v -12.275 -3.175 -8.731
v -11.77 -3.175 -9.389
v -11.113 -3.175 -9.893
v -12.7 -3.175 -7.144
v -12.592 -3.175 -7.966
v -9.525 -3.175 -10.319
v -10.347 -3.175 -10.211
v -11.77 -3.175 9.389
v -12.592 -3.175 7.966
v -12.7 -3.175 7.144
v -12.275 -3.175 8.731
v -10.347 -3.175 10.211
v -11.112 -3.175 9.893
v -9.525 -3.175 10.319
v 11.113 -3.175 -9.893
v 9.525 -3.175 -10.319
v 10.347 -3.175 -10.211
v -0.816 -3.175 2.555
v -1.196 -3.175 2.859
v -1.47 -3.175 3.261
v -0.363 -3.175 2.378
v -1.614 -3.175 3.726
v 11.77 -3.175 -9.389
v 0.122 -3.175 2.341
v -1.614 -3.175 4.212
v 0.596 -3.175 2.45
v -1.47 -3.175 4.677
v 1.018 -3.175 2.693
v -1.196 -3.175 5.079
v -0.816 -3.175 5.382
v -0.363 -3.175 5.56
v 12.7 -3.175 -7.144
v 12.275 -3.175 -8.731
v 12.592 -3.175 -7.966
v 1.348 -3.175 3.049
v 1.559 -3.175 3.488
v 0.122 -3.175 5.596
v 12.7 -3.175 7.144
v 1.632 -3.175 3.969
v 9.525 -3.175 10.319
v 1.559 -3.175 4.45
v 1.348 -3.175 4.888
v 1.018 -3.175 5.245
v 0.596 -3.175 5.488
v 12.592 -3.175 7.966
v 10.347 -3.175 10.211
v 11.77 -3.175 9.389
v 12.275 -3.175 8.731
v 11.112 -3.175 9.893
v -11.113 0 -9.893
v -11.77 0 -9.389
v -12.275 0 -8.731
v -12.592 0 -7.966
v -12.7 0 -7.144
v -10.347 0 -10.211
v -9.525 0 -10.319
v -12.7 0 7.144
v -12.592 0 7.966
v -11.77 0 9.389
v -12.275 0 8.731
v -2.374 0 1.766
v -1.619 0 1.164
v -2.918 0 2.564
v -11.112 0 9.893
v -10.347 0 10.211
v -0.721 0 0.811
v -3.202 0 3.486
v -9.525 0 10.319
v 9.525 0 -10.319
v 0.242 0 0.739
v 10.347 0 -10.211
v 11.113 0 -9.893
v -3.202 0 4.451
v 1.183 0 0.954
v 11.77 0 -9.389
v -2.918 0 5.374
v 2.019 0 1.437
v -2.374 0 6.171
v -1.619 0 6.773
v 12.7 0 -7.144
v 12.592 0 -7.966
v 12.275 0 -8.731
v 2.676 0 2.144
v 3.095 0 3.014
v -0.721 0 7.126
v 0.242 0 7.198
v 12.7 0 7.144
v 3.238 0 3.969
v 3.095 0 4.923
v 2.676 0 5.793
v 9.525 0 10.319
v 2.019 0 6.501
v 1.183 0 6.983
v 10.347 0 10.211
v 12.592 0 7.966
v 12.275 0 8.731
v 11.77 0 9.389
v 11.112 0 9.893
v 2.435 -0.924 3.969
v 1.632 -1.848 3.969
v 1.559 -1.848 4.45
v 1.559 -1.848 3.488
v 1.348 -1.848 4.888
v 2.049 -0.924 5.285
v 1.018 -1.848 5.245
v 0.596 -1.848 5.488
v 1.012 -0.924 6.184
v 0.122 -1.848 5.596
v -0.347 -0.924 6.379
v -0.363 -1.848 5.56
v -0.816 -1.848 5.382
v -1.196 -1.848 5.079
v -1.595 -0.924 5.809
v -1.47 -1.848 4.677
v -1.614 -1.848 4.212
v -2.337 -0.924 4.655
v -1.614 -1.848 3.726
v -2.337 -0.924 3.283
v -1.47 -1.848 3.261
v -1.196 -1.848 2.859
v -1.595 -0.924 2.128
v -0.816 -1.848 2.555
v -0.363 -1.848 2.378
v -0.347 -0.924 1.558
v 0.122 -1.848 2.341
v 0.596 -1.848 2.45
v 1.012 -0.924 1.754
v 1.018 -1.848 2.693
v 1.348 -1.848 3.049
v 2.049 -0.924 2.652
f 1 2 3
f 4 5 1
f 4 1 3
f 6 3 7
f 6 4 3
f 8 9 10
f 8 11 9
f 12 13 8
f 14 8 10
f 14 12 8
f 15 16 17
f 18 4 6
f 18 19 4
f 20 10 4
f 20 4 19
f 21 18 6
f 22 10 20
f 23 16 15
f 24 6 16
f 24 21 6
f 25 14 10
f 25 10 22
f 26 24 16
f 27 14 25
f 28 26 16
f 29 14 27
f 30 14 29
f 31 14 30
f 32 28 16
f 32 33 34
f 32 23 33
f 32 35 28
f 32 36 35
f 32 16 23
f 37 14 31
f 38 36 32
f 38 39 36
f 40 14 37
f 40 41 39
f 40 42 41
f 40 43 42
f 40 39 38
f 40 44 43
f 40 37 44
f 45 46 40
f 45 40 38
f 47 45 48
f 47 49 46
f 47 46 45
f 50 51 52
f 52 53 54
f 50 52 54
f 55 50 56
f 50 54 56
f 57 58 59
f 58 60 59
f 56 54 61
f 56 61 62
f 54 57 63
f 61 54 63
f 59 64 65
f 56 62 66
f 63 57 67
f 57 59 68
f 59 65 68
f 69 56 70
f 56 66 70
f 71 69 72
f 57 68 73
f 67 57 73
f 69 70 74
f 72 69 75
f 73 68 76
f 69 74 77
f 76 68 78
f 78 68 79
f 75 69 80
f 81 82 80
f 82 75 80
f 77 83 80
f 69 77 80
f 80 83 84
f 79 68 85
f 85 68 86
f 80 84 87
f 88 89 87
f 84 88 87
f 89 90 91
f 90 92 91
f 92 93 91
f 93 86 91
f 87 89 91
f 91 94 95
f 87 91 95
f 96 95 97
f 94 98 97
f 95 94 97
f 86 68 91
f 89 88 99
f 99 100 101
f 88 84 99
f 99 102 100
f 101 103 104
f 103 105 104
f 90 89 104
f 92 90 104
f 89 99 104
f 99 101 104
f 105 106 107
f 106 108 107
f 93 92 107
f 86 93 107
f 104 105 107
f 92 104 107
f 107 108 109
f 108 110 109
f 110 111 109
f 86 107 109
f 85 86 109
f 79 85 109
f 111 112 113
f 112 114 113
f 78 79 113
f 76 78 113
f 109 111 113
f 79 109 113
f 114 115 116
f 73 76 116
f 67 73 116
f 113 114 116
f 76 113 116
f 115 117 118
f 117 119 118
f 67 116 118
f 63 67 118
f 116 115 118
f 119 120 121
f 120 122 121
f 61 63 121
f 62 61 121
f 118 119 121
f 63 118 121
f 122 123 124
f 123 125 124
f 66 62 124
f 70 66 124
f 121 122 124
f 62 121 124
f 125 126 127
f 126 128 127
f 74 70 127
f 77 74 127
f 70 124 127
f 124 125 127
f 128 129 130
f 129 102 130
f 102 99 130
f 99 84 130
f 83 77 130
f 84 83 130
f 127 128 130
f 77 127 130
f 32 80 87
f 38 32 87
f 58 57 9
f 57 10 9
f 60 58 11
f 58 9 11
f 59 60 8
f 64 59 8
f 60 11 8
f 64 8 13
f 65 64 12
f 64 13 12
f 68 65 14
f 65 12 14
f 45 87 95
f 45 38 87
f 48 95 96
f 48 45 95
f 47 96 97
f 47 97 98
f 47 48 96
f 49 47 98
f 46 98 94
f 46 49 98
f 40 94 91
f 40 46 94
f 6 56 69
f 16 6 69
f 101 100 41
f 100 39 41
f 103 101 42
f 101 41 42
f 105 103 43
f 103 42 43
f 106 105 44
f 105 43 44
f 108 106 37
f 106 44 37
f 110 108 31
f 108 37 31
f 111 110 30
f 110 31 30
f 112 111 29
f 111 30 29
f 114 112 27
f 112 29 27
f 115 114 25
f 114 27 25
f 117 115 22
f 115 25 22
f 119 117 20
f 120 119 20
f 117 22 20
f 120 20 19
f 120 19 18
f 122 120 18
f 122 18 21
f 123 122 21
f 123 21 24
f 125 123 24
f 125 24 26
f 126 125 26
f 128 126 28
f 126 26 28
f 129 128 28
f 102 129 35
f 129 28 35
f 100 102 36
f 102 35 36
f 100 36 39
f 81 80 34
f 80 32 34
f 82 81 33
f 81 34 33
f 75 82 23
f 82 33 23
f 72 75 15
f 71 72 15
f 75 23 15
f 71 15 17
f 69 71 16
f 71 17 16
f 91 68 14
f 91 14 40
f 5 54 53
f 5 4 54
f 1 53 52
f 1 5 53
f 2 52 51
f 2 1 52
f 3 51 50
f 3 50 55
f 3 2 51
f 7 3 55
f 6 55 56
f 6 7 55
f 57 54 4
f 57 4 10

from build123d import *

# Parameters (mm, degrees)
F0_W           = 25.4
F0_H           = 20.6375
F1_DEPTH       = 3.175
F3_D           = 3.2639
F3_CSINK_D     = 6.477
F3_CSINK_ANGLE = 82
F4_R           = 3.175


with BuildPart() as f1:
    # F0 (on Front) → F1 (new body)
    with BuildSketch(Plane.XZ):
        Rectangle(F0_W, F0_H)
    extrude(amount=F1_DEPTH)

    # F3 (through all)
    with Locations(Plane(origin=(0, 0, 0), x_dir=(-1, 0, 0), z_dir=(0, 1, 0))):
        with Locations((0, 3.96875)):
            CounterSinkHole(F3_D / 2, F3_CSINK_D / 2, counter_sink_angle=F3_CSINK_ANGLE)

    # F4
    f4_edges = [f1.edges().sort_by_distance(p)[0] for p in [
        (12.7, -1.5875, 10.31875),
        (-12.7, -1.5875, 10.31875),
        (-12.7, -1.5875, -10.31875),
        (12.7, -1.5875, -10.31875),
    ]]
    fillet(f4_edges, radius=F4_R)


solid = f1.part
